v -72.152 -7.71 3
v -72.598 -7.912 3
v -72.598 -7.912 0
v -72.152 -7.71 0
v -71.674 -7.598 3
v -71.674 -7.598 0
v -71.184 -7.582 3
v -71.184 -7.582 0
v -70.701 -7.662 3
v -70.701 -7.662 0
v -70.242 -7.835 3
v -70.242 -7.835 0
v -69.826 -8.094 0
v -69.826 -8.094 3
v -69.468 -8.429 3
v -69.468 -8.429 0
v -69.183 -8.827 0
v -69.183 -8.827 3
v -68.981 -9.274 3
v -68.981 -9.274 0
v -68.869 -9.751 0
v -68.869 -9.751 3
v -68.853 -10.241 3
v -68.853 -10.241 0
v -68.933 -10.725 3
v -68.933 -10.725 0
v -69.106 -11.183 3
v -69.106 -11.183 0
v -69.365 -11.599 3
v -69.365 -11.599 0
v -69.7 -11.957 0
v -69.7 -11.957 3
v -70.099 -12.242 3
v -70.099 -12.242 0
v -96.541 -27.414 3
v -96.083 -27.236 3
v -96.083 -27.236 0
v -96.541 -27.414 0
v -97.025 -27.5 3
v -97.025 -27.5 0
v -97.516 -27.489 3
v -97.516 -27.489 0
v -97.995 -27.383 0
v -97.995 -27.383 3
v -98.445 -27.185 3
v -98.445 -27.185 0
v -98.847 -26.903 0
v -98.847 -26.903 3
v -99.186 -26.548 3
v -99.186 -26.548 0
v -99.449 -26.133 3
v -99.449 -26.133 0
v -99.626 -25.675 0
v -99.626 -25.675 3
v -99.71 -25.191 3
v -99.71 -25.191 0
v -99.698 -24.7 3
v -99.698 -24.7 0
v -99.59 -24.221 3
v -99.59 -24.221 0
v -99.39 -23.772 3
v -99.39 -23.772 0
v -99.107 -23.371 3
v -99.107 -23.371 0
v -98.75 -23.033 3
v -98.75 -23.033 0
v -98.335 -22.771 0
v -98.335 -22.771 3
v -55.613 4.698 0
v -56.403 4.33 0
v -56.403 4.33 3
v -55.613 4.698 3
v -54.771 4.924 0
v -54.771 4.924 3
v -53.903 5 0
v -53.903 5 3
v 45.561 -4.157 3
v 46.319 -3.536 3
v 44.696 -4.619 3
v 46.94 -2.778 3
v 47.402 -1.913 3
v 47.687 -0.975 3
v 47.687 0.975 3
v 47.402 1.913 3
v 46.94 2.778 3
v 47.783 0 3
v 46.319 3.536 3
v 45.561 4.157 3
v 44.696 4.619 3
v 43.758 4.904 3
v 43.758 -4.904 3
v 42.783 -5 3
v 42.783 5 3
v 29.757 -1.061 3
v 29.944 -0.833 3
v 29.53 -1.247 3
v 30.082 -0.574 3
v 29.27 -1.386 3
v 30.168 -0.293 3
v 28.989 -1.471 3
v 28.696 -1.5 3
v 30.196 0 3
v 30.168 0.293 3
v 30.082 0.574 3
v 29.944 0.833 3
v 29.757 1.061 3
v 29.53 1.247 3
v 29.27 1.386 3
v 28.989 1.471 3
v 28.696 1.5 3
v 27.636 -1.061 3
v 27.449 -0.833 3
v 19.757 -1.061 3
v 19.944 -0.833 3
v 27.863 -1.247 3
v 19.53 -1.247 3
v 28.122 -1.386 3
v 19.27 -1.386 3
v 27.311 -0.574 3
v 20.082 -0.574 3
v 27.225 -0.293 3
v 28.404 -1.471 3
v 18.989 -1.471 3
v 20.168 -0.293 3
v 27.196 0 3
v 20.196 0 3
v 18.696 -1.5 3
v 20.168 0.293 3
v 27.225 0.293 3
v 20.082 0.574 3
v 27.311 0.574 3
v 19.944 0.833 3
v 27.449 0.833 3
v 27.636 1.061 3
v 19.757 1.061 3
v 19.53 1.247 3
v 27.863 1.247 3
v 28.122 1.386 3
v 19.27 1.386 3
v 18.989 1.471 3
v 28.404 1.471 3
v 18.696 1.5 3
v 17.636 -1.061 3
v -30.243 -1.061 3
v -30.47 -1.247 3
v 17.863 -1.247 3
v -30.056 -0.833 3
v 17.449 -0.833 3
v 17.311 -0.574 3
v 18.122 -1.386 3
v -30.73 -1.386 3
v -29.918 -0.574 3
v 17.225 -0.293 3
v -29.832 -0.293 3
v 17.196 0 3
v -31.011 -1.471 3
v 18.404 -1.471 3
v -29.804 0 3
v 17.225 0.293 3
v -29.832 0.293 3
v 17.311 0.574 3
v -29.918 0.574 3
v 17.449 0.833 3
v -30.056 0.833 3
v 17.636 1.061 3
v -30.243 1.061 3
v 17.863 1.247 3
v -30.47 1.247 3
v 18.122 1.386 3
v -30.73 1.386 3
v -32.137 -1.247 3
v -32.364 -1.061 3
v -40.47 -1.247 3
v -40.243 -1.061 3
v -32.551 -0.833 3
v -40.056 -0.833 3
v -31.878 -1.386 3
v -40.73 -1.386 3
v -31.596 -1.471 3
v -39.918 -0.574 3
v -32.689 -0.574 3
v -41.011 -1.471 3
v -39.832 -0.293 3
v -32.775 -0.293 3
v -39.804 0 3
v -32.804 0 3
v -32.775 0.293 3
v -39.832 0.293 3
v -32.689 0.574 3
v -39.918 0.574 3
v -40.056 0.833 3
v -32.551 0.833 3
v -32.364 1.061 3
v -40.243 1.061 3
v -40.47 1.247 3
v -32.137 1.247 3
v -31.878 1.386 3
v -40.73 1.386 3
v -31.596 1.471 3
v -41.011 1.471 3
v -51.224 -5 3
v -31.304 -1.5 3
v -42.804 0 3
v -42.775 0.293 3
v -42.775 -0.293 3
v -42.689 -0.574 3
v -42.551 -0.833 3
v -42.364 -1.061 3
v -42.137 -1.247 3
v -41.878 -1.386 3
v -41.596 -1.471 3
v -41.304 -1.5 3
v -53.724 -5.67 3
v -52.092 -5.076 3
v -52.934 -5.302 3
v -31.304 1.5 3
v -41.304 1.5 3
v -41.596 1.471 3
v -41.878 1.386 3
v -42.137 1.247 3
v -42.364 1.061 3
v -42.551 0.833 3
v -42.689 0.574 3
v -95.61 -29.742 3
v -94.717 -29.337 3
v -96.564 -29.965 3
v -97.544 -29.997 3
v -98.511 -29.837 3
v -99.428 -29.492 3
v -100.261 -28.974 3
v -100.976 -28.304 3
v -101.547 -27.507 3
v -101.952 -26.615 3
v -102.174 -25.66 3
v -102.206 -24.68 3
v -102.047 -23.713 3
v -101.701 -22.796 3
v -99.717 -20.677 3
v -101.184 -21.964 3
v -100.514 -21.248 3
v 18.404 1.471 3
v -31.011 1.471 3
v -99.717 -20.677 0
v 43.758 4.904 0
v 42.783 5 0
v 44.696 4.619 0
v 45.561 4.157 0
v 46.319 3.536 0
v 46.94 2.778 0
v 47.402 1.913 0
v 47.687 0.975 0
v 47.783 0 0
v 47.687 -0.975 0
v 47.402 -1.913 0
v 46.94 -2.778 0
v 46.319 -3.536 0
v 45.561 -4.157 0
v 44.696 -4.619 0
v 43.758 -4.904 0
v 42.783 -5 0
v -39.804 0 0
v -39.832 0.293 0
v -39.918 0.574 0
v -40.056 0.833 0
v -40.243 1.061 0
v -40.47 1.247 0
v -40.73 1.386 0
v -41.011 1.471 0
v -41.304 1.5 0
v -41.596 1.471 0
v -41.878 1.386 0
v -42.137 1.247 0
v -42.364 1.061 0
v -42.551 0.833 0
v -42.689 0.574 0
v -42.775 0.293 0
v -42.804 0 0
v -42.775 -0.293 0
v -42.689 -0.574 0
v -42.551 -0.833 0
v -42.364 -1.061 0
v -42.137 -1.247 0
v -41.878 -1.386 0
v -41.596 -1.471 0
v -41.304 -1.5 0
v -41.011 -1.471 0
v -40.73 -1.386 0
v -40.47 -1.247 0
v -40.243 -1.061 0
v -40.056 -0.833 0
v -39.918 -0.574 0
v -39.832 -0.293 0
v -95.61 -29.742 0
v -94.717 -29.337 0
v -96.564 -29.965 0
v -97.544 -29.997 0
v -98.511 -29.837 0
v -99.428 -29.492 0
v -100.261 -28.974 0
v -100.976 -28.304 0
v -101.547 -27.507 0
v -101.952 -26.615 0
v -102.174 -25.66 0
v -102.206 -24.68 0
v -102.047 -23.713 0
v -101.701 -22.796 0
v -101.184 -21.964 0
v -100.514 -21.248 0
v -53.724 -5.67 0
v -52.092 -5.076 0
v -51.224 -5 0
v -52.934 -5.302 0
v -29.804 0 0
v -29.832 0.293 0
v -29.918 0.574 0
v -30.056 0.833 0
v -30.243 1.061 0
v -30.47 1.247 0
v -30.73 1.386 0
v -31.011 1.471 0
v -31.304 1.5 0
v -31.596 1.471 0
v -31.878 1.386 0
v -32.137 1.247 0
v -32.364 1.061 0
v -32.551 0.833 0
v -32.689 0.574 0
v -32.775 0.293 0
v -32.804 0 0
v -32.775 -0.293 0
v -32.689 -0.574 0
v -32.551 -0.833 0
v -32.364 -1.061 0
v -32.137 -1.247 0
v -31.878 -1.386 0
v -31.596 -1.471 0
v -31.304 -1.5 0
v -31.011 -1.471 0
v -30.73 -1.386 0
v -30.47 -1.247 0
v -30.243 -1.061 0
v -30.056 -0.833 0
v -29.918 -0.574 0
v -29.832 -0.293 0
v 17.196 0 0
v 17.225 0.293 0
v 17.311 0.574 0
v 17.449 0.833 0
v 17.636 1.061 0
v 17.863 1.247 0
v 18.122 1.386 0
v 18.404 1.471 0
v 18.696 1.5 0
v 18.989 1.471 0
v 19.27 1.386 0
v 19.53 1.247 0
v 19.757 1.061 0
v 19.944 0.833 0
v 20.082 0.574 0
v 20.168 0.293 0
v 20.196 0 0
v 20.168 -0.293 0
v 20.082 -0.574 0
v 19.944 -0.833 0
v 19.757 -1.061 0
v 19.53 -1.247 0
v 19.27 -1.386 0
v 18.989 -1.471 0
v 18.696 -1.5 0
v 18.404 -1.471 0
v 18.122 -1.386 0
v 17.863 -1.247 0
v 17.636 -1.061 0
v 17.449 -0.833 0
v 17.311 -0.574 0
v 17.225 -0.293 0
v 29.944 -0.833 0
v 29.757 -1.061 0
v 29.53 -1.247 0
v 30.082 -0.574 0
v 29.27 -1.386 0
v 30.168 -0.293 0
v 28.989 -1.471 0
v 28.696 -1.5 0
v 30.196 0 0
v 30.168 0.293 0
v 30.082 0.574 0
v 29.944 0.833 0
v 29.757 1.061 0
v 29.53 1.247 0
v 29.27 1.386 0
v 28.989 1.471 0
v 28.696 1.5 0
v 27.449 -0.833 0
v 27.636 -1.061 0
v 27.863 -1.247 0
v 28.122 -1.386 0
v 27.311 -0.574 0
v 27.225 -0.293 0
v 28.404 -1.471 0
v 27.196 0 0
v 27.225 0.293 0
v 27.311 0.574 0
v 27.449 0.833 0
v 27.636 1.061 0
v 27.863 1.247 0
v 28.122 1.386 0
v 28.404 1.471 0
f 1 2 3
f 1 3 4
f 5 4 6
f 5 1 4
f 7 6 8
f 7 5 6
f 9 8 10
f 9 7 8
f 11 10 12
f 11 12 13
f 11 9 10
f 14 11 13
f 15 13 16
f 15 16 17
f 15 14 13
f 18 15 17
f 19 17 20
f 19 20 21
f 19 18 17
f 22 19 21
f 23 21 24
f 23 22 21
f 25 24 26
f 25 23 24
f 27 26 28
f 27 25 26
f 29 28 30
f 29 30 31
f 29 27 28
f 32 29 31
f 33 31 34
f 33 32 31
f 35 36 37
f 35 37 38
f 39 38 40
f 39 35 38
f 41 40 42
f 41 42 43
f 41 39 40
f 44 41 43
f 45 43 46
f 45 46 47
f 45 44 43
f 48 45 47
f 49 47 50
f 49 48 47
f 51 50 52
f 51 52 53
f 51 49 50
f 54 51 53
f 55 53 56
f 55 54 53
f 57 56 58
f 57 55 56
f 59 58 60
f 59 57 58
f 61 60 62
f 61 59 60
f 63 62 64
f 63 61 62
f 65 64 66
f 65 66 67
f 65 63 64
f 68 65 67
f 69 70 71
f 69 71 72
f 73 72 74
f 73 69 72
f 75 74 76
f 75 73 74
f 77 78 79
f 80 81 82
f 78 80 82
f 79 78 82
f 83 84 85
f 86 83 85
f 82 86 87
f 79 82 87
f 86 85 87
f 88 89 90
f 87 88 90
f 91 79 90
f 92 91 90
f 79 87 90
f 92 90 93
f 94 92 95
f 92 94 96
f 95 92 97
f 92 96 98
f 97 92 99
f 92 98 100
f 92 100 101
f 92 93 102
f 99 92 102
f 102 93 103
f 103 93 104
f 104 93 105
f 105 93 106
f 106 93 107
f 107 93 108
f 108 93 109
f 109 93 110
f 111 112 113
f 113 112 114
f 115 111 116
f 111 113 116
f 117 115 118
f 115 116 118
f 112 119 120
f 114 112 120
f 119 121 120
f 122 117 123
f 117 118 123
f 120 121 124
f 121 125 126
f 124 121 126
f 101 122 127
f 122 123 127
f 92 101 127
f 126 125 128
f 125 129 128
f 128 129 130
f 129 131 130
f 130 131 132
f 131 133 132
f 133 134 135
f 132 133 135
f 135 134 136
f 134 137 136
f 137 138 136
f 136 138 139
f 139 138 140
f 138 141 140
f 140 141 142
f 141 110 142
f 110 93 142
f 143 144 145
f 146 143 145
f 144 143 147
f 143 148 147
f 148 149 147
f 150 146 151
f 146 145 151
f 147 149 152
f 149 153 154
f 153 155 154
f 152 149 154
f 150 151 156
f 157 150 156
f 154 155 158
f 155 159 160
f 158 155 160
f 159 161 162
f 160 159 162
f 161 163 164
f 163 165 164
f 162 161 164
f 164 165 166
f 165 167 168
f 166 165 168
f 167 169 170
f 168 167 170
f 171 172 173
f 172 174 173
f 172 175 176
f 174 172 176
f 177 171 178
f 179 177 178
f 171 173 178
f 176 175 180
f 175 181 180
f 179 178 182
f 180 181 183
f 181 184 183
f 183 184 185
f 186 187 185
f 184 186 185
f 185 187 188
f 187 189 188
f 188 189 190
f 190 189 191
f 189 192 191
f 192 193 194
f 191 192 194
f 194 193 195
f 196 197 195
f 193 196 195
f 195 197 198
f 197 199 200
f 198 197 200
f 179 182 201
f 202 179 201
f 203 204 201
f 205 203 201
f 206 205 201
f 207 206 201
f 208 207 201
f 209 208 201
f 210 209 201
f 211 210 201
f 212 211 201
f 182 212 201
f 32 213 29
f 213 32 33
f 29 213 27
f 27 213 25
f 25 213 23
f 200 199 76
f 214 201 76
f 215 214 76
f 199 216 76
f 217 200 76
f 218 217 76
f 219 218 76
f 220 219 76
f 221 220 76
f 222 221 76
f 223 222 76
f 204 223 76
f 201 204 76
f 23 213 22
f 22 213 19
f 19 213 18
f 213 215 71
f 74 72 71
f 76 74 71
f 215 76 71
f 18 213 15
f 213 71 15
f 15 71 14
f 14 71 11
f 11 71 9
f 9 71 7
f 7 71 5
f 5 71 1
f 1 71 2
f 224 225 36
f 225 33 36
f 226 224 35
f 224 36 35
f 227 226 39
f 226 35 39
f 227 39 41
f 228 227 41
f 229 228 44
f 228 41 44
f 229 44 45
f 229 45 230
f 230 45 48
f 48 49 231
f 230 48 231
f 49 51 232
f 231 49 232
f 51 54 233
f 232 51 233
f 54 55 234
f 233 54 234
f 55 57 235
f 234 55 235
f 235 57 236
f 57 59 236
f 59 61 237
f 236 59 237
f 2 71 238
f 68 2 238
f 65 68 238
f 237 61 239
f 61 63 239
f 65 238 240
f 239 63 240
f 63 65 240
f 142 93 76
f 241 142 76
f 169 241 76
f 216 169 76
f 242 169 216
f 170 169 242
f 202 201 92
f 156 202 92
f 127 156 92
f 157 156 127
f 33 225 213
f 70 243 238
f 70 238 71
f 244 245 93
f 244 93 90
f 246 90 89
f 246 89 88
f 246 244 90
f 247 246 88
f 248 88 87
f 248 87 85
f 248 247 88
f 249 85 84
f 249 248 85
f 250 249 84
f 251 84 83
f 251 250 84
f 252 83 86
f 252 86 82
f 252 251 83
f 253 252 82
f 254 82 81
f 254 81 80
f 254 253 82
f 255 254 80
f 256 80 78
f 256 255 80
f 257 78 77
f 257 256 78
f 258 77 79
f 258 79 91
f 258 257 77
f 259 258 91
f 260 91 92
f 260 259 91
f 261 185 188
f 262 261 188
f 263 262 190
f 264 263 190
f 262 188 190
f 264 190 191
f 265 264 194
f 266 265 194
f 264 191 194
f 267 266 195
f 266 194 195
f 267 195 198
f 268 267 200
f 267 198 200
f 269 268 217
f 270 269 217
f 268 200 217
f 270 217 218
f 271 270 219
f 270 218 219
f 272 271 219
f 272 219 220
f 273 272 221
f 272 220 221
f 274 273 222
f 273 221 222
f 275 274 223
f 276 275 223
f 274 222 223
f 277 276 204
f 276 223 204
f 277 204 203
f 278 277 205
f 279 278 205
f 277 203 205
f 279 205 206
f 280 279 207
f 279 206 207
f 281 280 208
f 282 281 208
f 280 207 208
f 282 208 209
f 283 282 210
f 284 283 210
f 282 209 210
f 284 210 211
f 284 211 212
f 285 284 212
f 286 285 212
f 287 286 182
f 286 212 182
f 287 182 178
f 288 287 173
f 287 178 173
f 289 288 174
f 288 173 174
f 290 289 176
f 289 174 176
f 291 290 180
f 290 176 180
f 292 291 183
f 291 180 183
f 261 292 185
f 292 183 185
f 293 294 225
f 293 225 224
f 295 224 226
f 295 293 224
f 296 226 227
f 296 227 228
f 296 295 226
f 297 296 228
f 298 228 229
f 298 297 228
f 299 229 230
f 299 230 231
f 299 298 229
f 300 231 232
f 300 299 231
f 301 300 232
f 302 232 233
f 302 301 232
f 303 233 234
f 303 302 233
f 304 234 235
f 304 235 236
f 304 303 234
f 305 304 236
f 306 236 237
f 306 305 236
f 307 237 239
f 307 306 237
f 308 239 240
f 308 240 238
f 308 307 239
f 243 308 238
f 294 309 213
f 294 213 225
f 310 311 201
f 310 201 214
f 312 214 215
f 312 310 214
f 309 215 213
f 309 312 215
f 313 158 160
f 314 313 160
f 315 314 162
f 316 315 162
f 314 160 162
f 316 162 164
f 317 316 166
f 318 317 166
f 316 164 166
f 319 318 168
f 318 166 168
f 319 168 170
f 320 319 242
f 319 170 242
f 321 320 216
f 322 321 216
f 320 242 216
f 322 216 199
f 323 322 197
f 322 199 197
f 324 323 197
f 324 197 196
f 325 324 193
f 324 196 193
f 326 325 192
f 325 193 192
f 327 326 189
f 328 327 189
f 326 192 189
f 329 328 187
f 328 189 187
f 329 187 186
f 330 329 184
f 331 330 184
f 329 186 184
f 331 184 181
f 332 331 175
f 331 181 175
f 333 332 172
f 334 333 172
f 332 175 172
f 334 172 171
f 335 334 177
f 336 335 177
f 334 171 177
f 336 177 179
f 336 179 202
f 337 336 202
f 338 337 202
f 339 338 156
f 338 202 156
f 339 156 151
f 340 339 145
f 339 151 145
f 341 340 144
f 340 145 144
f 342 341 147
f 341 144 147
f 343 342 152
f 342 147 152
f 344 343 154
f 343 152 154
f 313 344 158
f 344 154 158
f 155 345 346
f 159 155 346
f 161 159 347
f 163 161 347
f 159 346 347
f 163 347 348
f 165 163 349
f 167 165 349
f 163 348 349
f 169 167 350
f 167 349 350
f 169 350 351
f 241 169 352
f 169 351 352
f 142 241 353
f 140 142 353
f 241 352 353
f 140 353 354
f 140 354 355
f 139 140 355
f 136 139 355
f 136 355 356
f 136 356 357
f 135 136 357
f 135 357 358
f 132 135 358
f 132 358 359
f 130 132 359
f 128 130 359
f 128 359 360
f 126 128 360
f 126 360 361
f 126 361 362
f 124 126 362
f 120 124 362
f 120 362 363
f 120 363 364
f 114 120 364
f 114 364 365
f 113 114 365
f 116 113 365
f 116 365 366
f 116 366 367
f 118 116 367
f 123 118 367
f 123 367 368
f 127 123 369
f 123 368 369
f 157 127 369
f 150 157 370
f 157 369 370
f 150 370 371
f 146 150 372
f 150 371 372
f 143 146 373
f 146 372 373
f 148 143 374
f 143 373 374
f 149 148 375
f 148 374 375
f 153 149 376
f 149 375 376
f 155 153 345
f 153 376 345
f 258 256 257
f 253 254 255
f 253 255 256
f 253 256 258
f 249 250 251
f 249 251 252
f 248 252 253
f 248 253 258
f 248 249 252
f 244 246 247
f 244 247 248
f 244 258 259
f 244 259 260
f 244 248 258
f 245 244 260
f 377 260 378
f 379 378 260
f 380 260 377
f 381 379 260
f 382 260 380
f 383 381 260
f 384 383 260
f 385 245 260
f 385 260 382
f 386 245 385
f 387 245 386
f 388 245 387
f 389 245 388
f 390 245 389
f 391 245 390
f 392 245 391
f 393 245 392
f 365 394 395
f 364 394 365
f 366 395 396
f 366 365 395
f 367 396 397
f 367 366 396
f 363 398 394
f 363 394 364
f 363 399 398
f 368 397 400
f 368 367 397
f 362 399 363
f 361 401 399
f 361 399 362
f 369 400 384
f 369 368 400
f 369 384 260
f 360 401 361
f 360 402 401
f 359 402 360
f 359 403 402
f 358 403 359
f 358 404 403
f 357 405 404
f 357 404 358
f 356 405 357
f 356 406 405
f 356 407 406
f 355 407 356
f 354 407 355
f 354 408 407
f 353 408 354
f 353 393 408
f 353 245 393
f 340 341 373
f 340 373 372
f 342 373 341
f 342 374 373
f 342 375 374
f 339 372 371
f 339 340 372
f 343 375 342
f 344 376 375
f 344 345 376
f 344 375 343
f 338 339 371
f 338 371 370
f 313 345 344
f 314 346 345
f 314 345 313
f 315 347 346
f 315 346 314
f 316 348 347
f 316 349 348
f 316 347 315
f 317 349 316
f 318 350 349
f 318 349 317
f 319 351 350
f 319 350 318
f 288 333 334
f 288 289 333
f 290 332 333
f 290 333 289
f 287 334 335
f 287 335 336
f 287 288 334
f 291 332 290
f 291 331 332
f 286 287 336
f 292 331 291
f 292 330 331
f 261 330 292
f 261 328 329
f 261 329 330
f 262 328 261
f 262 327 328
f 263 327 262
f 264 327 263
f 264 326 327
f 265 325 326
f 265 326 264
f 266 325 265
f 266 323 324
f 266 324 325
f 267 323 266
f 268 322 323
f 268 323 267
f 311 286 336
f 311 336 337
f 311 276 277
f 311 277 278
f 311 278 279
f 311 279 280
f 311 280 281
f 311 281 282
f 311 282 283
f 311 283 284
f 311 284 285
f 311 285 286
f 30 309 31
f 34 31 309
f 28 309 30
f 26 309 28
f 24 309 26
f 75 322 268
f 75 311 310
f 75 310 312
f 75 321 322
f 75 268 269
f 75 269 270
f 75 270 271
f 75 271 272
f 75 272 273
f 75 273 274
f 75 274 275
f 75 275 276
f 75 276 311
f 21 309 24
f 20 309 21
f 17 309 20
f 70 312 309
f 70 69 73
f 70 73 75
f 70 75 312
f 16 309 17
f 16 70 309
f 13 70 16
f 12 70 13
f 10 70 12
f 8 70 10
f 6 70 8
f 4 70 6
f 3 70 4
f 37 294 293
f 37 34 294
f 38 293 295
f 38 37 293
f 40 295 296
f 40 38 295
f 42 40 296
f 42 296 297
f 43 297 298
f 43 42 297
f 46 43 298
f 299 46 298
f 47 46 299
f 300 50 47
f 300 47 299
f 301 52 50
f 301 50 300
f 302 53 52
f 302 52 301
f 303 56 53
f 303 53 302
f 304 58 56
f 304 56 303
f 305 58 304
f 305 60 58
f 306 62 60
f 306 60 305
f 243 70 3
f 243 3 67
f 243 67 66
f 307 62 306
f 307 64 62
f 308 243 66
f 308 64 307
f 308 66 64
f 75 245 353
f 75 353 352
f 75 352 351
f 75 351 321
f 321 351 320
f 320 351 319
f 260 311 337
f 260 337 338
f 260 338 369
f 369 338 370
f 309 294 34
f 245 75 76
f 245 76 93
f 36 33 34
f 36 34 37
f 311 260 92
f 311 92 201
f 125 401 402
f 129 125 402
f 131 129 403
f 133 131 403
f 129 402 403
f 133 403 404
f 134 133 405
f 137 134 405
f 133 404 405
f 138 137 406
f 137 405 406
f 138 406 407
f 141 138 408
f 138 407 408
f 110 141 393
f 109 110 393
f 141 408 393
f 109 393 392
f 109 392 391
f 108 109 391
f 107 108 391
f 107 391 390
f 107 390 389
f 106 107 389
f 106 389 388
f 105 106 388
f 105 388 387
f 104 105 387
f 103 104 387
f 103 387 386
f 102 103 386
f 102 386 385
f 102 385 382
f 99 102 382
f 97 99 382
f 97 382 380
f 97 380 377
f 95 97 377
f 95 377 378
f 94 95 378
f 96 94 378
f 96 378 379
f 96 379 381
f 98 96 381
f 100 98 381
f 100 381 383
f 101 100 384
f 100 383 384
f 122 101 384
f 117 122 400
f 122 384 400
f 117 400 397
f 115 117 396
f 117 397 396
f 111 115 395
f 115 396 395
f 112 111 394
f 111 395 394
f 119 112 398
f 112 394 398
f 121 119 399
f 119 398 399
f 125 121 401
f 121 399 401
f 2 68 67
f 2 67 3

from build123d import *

# Parameters (mm, degrees)
EXTRUDE_1_DEPTH     = 3
CUT_EXTRUDE_1_DEPTH = 3
SKETCH_3_R          = 1.5
CUT_EXTRUDE_2_DEPTH = 3
SKETCH_4_R          = 1.5
CUT_EXTRUDE_3_DEPTH = 4


with BuildPart() as part:
    # 草图1 → 凸台-拉伸1 (new body)
    with BuildSketch(Plane.XY):
        with BuildLine():
            Line((-53.903075976, 5), (42.782990351, 5))
            ThreePointArc((42.782990351, 5), (47.782990351, 0), (42.782990351, -5))
            Line((42.782990351, -5), (-51.223584051, -5))
            ThreePointArc((-51.223584051, -5), (-52.517679277, -5.170370869), (-53.723584051, -5.669872981))
            Line((-53.723584051, -5.669872981), (-94.717009649, -29.337438285))
            ThreePointArc((-94.717009649, -29.337438285), (-101.547136668, -27.507311266), (-99.717009649, -20.677184247))
            Line((-99.717009649, -20.677184247), (-56.403075976, 4.330127019))
            ThreePointArc((-56.403075976, 4.330127019), (-55.197171201, 4.829629131), (-53.903075976, 5))
        make_face()
    extrude(amount=EXTRUDE_1_DEPTH)

    # 草图2 → 切除-拉伸1 (cut)
    with BuildSketch(Plane.XY.offset(3)):
        with BuildLine():
            Line((-98.334747096, -22.771095042), (-72.598059837, -7.912011725))
            ThreePointArc((-72.598059837, -7.912011725), (-69.182829293, -8.82736459), (-70.098638571, -12.242472773))
            Line((-70.098638571, -12.242472773), (-96.083409035, -27.235527963))
            ThreePointArc((-96.083409035, -27.235527963), (-99.449240201, -26.132987403), (-98.334747096, -22.771095042))
        make_face()
    extrude(amount=-CUT_EXTRUDE_1_DEPTH, mode=Mode.SUBTRACT)

    # 草图3 → 切除-拉伸2 (cut)
    with BuildSketch(Plane.XY.offset(3)):
        with Locations((-31.303593391, 0)):
            Circle(SKETCH_3_R)
        with Locations((-41.303593391, 0)):
            Circle(SKETCH_3_R)
    extrude(amount=-CUT_EXTRUDE_2_DEPTH, mode=Mode.SUBTRACT)

    # 草图4 → 切除-拉伸3 (cut, through all)
    with BuildSketch(Plane(origin=(0, 0, 0), x_dir=(-1, 0, 0), z_dir=(0, 0, -1))):
        with Locations((-18.696406609, 0)):
            Circle(SKETCH_4_R)
        with Locations((-28.696406609, 0)):
            Circle(SKETCH_4_R)
    extrude(amount=-CUT_EXTRUDE_3_DEPTH, mode=Mode.SUBTRACT)


solid = part.part
